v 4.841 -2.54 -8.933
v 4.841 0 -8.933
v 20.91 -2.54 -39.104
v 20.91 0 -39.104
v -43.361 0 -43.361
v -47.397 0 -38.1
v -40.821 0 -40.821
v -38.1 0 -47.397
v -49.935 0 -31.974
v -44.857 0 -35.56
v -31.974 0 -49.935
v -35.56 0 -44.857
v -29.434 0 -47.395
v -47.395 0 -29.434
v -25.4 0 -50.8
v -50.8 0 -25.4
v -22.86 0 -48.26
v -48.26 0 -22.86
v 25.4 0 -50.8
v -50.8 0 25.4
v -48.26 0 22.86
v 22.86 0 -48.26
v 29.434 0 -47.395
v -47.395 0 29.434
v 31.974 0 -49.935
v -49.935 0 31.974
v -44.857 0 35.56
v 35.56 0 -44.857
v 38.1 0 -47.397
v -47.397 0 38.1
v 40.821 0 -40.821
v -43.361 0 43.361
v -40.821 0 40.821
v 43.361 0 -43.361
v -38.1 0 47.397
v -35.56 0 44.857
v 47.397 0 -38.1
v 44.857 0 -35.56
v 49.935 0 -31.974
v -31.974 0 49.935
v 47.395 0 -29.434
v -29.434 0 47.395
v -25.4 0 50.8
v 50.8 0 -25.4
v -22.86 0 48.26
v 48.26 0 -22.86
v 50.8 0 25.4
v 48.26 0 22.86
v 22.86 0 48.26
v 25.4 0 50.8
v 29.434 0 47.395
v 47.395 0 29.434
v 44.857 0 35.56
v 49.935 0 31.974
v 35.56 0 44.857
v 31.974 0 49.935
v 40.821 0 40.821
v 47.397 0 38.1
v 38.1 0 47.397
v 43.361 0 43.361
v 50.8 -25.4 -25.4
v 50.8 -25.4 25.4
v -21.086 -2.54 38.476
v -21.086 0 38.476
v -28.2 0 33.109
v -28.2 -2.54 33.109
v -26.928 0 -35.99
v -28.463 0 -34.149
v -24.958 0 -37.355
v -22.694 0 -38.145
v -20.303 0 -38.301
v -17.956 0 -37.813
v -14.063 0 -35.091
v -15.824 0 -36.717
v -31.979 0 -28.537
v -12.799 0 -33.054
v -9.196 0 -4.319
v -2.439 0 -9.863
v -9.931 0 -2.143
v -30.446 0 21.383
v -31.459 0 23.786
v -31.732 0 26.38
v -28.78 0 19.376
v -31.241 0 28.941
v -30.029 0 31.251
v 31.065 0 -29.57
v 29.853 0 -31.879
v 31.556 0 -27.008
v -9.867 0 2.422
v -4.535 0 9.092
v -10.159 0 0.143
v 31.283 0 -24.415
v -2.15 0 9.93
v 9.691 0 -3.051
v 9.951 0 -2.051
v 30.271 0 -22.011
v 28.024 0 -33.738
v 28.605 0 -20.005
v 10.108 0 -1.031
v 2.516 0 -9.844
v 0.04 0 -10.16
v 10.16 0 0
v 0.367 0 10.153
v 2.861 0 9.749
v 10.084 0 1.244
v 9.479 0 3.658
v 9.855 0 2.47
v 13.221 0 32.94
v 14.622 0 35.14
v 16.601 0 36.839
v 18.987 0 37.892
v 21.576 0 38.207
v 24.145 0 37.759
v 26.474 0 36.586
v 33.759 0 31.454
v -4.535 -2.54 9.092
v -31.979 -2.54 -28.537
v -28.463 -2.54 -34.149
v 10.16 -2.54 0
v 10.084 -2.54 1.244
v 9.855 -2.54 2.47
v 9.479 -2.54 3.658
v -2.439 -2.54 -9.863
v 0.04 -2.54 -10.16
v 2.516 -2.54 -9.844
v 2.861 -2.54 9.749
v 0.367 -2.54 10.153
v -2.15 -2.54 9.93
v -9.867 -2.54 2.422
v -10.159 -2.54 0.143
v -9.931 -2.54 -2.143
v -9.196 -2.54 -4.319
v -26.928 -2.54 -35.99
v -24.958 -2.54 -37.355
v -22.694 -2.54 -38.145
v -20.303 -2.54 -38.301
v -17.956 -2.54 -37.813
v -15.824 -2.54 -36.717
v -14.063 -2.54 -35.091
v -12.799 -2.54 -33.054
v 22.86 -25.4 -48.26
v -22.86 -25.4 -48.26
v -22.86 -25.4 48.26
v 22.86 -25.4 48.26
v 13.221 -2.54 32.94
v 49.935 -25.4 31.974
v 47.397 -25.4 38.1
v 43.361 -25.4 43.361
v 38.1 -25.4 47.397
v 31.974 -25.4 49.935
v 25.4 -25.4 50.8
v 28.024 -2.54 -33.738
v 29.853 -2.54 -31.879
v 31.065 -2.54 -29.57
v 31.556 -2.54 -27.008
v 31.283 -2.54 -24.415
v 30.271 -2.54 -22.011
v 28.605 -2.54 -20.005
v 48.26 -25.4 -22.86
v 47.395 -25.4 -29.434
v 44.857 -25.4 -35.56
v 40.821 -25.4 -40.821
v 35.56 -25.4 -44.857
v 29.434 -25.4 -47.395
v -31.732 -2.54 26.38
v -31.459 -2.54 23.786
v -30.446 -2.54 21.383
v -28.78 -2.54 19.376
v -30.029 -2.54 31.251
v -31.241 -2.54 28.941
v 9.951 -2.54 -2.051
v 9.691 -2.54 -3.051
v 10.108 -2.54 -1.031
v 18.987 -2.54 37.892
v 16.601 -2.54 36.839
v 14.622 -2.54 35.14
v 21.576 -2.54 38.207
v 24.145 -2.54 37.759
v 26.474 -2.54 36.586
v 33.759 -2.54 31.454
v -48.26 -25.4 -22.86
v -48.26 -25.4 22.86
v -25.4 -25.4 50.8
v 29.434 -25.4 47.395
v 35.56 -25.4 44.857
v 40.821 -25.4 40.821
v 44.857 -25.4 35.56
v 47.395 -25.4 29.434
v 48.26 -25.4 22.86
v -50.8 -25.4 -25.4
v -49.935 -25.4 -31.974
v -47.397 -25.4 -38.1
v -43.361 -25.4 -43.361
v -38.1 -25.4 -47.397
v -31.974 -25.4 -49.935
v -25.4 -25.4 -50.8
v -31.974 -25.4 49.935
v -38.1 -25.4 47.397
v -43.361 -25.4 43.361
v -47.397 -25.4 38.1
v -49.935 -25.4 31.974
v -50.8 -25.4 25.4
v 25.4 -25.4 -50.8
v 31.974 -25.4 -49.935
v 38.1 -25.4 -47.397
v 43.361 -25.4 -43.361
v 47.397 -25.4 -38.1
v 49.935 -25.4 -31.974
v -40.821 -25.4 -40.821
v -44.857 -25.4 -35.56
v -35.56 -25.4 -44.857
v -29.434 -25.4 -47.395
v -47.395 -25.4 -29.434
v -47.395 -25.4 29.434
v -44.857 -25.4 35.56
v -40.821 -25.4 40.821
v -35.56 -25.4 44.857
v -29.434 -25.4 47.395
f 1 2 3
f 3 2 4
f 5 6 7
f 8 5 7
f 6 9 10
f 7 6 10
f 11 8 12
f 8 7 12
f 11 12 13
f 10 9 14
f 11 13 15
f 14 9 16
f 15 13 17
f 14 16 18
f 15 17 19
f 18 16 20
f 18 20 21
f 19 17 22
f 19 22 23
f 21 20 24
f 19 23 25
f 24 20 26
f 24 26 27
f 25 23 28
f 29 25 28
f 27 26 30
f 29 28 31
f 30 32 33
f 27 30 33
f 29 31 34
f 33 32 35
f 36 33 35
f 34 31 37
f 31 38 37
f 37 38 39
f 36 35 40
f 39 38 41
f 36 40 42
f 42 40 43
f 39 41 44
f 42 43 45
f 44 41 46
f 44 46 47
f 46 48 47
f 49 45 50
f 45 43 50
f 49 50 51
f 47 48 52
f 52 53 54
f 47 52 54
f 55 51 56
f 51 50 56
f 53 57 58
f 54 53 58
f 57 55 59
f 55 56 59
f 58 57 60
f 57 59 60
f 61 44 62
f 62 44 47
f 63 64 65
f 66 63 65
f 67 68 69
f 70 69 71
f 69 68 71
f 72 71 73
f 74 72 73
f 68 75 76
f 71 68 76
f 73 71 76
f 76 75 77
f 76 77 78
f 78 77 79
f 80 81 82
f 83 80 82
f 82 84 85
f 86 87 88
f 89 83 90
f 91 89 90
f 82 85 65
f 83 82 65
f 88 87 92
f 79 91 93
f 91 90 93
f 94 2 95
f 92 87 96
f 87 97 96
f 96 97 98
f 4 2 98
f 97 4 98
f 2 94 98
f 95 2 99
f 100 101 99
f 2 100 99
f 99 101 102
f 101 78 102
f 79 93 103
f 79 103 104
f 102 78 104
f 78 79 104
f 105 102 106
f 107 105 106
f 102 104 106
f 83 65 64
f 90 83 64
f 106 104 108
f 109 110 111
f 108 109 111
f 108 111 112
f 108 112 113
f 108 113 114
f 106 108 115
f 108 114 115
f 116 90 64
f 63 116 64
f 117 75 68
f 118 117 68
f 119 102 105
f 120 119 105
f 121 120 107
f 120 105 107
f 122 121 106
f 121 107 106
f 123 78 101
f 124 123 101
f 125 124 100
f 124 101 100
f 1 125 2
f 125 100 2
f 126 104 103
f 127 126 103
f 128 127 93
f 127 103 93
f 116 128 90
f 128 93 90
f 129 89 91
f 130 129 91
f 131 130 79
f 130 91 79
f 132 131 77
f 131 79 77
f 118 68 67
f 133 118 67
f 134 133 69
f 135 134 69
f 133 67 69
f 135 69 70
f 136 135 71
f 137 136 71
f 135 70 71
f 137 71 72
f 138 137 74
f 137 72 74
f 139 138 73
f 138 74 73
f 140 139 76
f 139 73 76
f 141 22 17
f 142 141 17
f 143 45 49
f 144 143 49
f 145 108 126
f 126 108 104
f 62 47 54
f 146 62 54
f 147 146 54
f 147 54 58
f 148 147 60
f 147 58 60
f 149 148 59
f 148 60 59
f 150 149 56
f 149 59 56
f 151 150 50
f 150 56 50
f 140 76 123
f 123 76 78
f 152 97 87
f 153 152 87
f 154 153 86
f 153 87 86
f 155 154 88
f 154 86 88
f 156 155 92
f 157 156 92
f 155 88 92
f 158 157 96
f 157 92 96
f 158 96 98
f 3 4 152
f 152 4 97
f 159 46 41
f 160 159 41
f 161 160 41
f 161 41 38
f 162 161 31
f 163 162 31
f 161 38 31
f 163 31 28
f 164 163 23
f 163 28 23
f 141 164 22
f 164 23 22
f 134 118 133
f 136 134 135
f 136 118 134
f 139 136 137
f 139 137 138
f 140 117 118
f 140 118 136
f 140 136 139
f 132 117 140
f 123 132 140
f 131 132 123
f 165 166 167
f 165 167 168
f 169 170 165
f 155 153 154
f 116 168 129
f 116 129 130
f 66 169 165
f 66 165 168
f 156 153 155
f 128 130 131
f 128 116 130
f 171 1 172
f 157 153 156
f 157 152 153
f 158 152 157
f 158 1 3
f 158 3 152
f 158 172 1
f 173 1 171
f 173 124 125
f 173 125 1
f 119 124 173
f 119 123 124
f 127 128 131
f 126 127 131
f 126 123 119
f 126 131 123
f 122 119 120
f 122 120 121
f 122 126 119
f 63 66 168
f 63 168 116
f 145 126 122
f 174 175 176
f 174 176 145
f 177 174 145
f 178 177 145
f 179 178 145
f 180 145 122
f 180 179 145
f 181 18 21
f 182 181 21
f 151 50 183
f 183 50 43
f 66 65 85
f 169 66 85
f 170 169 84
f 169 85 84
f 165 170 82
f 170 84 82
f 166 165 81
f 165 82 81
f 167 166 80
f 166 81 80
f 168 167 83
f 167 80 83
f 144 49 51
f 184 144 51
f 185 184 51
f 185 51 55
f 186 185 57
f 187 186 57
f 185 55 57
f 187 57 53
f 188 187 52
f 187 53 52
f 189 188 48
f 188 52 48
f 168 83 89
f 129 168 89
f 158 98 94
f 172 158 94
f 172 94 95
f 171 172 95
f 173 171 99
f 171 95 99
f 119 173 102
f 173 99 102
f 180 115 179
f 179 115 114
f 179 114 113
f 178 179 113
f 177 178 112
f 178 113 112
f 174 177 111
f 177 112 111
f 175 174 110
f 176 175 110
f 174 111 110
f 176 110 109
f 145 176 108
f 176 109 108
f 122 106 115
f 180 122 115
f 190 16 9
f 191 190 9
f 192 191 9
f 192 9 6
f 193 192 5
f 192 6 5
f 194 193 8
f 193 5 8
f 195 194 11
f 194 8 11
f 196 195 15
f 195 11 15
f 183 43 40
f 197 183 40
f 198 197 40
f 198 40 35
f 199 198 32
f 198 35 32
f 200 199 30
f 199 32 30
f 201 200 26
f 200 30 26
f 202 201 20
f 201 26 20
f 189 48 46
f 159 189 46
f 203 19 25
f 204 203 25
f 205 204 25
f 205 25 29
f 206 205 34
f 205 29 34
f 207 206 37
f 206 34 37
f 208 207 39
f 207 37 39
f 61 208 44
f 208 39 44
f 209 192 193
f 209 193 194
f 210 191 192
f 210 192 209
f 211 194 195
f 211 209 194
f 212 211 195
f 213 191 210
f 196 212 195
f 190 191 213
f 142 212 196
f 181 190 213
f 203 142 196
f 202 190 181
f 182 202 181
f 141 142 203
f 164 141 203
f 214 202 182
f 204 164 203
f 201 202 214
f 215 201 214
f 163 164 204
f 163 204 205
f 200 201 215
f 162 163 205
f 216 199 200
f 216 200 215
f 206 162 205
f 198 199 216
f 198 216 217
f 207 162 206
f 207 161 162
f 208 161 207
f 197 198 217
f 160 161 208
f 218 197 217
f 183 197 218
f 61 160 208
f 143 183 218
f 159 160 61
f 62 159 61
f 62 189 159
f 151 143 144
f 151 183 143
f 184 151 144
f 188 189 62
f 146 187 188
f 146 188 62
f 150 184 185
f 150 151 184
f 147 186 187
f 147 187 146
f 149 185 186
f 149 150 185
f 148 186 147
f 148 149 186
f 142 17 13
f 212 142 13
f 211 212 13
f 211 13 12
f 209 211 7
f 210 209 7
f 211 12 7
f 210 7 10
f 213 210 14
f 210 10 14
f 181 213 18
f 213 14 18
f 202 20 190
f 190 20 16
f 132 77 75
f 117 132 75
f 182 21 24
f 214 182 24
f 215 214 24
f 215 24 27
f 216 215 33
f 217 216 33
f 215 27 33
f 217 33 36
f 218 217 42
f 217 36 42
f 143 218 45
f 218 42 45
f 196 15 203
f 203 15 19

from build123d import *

# Parameters (mm, degrees)
F1_DEPTH = 25.4
F3_DEPTH = 2.54


with BuildPart() as f1:
    # F0 (on Front) → F1 (new body)
    with BuildSketch(Plane.XZ):
        with BuildLine():
            ThreePointArc((50.8, 25.4), (43.360512, 43.360512), (25.4, 50.8))
            Line((25.4, 50.8), (-25.4, 50.8))
            ThreePointArc((-25.4, 50.8), (-43.360512, 43.360512), (-50.8, 25.4))
            Line((-50.8, 25.4), (-50.8, -25.4))
            ThreePointArc((-50.8, -25.4), (-43.360512, -43.360512), (-25.4, -50.8))
            Line((-25.4, -50.8), (25.4, -50.8))
            ThreePointArc((25.4, -50.8), (43.360512, -43.360512), (50.8, -25.4))
            Line((50.8, -25.4), (50.8, 25.4))
        make_face()
        with BuildLine():
            ThreePointArc((-48.26, 22.86), (-40.820512, 40.820512), (-22.86, 48.26))
            Line((-22.86, 48.26), (22.86, 48.26))
            ThreePointArc((22.86, 48.26), (40.820512, 40.820512), (48.26, 22.86))
            Line((48.26, 22.86), (48.26, -22.86))
            ThreePointArc((48.26, -22.86), (40.820512, -40.820512), (22.86, -48.26))
            Line((22.86, -48.26), (-22.86, -48.26))
            ThreePointArc((-22.86, -48.26), (-40.820512, -40.820512), (-48.26, -22.86))
            Line((-48.26, -22.86), (-48.26, 22.86))
        make_face(mode=Mode.SUBTRACT)
    extrude(amount=F1_DEPTH)


with BuildPart() as f3:
    # F2 (on Front) → F3 (new body)
    with BuildSketch(Plane.XZ):
        with BuildLine():
            ThreePointArc((9.691227, -3.050529), (10.042123, -1.543168), (10.16, 0))
            ThreePointArc((10.16, 0), (9.988178, 1.86062), (9.478523, 3.658307))
            ThreePointArc((9.478523, 3.658307), (6.880494, 7.475587), (2.861291, 9.748775))
            ThreePointArc((2.861291, 9.748775), (-0.898812, 10.120165), (-4.534608, 9.091916))
            ThreePointArc((-4.534608, 9.091916), (-7.935627, 6.344401), (-9.867092, 2.422004))
            ThreePointArc((-9.867092, 2.422004), (-10.11004, -1.006323), (-9.196063, -4.319493))
            ThreePointArc((-9.196063, -4.319493), (-6.444061, -7.854914), (-2.438979, -9.862909))
            ThreePointArc((-2.438979, -9.862909), (1.287689, -10.078068), (4.840533, -8.932796))
            ThreePointArc((4.840533, -8.932796), (7.838576, -6.463925), (9.691227, -3.050529))
        make_face()
        with BuildLine():
            ThreePointArc((2.861291, 9.748775), (6.880494, 7.475587), (9.478523, 3.658307))
            Line((9.478523, 3.658307), (33.758552, 31.453673))
            Line((33.758552, 31.453673), (26.474262, 36.585787))
            ThreePointArc((26.474262, 36.585787), (18.987079, 37.891517), (13.221226, 32.939975))
            Line((13.221226, 32.939975), (2.861291, 9.748775))
        make_face()
        with BuildLine():
            Line((28.604536, -20.004783), (9.691227, -3.050529))
            ThreePointArc((9.691227, -3.050529), (7.838576, -6.463925), (4.840533, -8.932796))
            Line((4.840533, -8.932796), (20.910398, -39.104288))
            Line((20.910398, -39.104288), (28.023838, -33.73787))
            ThreePointArc((28.023838, -33.73787), (31.556148, -27.008412), (28.604536, -20.004783))
        make_face()
        with BuildLine():
            ThreePointArc((-9.867092, 2.422004), (-7.935627, 6.344401), (-4.534608, 9.091916))
            Line((-4.534608, 9.091916), (-21.086262, 38.475763))
            Line((-21.086262, 38.475763), (-28.199703, 33.109346))
            ThreePointArc((-28.199703, 33.109346), (-31.732013, 26.379887), (-28.780401, 19.376258))
            Line((-28.780401, 19.376258), (-9.867092, 2.422004))
        make_face()
        with BuildLine():
            Line((-12.798914, -33.054109), (-2.438979, -9.862909))
            ThreePointArc((-2.438979, -9.862909), (-6.444061, -7.854914), (-9.196063, -4.319493))
            Line((-9.196063, -4.319493), (-31.979147, -28.536969))
            Line((-31.979147, -28.536969), (-28.463092, -34.14901))
            ThreePointArc((-28.463092, -34.14901), (-20.302514, -38.301084), (-12.798914, -33.054109))
        make_face()
    extrude(amount=F3_DEPTH)


solid = Compound([f1.part, f3.part])
